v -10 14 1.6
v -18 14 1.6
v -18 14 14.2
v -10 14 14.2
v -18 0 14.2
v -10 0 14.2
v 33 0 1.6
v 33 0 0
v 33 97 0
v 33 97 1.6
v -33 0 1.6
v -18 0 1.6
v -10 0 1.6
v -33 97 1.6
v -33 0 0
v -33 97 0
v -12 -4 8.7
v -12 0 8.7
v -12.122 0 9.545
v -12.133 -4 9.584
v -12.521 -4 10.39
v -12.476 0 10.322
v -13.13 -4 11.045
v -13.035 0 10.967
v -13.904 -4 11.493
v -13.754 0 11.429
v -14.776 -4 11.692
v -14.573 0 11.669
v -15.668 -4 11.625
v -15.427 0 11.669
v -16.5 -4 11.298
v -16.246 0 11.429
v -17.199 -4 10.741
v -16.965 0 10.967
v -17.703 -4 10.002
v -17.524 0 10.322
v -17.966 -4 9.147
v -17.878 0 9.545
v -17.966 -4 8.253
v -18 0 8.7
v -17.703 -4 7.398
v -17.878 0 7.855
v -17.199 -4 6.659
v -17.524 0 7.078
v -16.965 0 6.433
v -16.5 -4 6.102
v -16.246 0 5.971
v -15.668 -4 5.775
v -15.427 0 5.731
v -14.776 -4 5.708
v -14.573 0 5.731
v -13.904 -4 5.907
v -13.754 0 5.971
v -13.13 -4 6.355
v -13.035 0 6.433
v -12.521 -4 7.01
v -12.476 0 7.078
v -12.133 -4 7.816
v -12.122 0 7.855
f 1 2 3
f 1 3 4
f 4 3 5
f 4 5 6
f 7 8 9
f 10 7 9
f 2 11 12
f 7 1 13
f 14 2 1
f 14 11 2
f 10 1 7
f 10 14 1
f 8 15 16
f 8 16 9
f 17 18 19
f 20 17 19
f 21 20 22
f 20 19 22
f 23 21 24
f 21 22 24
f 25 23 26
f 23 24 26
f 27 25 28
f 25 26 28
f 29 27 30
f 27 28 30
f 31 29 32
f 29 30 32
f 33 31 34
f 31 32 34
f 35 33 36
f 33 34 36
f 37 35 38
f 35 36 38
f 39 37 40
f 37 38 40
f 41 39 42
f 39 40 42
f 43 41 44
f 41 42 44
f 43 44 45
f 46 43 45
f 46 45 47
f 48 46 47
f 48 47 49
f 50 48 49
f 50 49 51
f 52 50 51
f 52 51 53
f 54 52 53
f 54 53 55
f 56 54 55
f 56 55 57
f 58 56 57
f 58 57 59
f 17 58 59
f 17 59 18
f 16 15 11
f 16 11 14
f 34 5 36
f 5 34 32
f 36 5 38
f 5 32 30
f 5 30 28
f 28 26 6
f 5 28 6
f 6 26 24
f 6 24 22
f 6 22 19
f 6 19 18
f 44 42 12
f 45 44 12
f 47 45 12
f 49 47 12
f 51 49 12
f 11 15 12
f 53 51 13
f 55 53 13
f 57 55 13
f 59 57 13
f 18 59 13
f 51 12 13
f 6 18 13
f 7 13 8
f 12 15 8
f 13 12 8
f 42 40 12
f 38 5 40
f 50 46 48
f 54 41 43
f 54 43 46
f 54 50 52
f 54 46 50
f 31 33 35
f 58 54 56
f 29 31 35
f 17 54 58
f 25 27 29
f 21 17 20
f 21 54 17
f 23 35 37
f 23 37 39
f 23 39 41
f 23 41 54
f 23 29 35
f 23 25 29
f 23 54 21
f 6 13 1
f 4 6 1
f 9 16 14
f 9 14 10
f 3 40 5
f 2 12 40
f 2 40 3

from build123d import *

# Parameters (mm, degrees)
F0_W     = 66
F0_H     = 97
F1_DEPTH = 1.6
F2_W     = 8
F2_H     = 14
F3_DEPTH = 12.6
F5_DEPTH = 4


with BuildPart() as f1:
    # F0 (on Top) → F1 (new body)
    with BuildSketch(Plane.XY):
        with Locations((0, 48.5)):
            Rectangle(F0_W, F0_H)
    extrude(amount=F1_DEPTH)

    # F2 (on face) → F3 (join)
    with BuildSketch(Plane.XY.offset(1.6)):
        with Locations((-14, 7)):
            Rectangle(F2_W, F2_H)
    extrude(amount=F3_DEPTH)

    # F4 (on face) → F5 (join)
    with BuildSketch(Plane.XZ):
        with BuildLine():
            ThreePointArc((-18, 8.7), (-15, 5.7), (-12, 8.7))
            ThreePointArc((-12, 8.7), (-15, 11.7), (-18, 8.7))
        make_face()
    extrude(amount=F5_DEPTH)


solid = f1.part
